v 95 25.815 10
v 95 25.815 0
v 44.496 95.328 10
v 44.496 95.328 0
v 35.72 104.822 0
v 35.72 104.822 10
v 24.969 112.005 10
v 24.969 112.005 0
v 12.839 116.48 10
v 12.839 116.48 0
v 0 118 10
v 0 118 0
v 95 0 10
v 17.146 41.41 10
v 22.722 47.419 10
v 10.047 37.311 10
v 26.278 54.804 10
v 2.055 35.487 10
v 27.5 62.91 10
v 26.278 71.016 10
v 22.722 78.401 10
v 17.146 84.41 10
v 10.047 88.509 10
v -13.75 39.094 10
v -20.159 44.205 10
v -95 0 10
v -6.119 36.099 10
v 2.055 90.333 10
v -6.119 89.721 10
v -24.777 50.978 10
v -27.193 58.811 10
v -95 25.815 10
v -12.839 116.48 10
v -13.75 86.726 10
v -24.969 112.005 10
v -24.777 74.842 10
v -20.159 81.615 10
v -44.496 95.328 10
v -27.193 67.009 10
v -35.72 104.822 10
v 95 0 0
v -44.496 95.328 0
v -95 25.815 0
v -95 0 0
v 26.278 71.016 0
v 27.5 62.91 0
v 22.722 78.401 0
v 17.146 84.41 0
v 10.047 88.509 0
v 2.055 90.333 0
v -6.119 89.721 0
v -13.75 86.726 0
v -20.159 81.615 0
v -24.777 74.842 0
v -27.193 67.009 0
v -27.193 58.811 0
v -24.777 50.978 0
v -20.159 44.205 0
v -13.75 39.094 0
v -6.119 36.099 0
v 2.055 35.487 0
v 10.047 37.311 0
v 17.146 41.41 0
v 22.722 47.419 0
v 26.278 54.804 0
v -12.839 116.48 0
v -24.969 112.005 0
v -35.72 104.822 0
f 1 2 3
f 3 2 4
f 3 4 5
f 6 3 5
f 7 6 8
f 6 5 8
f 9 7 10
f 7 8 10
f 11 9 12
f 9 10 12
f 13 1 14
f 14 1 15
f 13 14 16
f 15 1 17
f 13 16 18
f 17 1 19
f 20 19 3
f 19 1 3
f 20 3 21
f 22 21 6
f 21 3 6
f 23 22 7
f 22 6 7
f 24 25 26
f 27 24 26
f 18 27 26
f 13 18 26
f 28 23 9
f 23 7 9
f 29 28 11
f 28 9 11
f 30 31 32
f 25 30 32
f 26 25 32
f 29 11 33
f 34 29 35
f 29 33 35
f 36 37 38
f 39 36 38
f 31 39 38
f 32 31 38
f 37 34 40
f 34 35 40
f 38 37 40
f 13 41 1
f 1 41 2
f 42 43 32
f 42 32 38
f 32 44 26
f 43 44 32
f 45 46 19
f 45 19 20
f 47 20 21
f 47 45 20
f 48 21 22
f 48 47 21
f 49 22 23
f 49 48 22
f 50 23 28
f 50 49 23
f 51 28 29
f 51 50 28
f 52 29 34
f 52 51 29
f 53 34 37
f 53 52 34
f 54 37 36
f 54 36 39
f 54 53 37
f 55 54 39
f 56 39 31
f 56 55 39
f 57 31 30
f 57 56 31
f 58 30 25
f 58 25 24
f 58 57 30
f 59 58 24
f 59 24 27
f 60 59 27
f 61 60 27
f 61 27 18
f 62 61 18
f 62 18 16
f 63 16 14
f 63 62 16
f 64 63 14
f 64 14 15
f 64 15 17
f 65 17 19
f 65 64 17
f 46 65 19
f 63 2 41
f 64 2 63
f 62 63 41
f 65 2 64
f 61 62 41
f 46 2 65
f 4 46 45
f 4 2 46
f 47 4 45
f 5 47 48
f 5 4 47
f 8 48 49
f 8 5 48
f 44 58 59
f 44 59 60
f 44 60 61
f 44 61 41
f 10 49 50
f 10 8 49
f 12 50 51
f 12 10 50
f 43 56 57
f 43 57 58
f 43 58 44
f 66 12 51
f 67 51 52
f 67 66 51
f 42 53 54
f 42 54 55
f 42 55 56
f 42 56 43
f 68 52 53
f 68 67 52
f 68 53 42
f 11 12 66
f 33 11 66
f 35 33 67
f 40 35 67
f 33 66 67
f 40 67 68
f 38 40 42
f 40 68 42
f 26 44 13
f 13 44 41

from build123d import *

# Parameters (mm, degrees)
SKETCH_R  = 27.5
PAD_DEPTH = 10


with BuildPart() as part:
    # Sketch → Pad (new body)
    with BuildSketch(Plane.XY):
        with BuildLine():
            Line((-95, 0), (-95, 25.815306))
            Line((-95, 25.815306), (-44.495935, 95.328189))
            ThreePointArc((0, 118), (-24.969477, 112.005359), (-44.495935, 95.328189))
            ThreePointArc((44.495935, 95.328189), (24.969477, 112.005359), (0, 118))
            Line((95, 25.815306), (44.495935, 95.328189))
            Line((95, 0), (95, 25.815306))
            Line((-95, 0), (95, 0))
        make_face()
        with Locations((0, 62.91)):
            Circle(SKETCH_R, mode=Mode.SUBTRACT)
    extrude(amount=PAD_DEPTH)


solid = part.part
